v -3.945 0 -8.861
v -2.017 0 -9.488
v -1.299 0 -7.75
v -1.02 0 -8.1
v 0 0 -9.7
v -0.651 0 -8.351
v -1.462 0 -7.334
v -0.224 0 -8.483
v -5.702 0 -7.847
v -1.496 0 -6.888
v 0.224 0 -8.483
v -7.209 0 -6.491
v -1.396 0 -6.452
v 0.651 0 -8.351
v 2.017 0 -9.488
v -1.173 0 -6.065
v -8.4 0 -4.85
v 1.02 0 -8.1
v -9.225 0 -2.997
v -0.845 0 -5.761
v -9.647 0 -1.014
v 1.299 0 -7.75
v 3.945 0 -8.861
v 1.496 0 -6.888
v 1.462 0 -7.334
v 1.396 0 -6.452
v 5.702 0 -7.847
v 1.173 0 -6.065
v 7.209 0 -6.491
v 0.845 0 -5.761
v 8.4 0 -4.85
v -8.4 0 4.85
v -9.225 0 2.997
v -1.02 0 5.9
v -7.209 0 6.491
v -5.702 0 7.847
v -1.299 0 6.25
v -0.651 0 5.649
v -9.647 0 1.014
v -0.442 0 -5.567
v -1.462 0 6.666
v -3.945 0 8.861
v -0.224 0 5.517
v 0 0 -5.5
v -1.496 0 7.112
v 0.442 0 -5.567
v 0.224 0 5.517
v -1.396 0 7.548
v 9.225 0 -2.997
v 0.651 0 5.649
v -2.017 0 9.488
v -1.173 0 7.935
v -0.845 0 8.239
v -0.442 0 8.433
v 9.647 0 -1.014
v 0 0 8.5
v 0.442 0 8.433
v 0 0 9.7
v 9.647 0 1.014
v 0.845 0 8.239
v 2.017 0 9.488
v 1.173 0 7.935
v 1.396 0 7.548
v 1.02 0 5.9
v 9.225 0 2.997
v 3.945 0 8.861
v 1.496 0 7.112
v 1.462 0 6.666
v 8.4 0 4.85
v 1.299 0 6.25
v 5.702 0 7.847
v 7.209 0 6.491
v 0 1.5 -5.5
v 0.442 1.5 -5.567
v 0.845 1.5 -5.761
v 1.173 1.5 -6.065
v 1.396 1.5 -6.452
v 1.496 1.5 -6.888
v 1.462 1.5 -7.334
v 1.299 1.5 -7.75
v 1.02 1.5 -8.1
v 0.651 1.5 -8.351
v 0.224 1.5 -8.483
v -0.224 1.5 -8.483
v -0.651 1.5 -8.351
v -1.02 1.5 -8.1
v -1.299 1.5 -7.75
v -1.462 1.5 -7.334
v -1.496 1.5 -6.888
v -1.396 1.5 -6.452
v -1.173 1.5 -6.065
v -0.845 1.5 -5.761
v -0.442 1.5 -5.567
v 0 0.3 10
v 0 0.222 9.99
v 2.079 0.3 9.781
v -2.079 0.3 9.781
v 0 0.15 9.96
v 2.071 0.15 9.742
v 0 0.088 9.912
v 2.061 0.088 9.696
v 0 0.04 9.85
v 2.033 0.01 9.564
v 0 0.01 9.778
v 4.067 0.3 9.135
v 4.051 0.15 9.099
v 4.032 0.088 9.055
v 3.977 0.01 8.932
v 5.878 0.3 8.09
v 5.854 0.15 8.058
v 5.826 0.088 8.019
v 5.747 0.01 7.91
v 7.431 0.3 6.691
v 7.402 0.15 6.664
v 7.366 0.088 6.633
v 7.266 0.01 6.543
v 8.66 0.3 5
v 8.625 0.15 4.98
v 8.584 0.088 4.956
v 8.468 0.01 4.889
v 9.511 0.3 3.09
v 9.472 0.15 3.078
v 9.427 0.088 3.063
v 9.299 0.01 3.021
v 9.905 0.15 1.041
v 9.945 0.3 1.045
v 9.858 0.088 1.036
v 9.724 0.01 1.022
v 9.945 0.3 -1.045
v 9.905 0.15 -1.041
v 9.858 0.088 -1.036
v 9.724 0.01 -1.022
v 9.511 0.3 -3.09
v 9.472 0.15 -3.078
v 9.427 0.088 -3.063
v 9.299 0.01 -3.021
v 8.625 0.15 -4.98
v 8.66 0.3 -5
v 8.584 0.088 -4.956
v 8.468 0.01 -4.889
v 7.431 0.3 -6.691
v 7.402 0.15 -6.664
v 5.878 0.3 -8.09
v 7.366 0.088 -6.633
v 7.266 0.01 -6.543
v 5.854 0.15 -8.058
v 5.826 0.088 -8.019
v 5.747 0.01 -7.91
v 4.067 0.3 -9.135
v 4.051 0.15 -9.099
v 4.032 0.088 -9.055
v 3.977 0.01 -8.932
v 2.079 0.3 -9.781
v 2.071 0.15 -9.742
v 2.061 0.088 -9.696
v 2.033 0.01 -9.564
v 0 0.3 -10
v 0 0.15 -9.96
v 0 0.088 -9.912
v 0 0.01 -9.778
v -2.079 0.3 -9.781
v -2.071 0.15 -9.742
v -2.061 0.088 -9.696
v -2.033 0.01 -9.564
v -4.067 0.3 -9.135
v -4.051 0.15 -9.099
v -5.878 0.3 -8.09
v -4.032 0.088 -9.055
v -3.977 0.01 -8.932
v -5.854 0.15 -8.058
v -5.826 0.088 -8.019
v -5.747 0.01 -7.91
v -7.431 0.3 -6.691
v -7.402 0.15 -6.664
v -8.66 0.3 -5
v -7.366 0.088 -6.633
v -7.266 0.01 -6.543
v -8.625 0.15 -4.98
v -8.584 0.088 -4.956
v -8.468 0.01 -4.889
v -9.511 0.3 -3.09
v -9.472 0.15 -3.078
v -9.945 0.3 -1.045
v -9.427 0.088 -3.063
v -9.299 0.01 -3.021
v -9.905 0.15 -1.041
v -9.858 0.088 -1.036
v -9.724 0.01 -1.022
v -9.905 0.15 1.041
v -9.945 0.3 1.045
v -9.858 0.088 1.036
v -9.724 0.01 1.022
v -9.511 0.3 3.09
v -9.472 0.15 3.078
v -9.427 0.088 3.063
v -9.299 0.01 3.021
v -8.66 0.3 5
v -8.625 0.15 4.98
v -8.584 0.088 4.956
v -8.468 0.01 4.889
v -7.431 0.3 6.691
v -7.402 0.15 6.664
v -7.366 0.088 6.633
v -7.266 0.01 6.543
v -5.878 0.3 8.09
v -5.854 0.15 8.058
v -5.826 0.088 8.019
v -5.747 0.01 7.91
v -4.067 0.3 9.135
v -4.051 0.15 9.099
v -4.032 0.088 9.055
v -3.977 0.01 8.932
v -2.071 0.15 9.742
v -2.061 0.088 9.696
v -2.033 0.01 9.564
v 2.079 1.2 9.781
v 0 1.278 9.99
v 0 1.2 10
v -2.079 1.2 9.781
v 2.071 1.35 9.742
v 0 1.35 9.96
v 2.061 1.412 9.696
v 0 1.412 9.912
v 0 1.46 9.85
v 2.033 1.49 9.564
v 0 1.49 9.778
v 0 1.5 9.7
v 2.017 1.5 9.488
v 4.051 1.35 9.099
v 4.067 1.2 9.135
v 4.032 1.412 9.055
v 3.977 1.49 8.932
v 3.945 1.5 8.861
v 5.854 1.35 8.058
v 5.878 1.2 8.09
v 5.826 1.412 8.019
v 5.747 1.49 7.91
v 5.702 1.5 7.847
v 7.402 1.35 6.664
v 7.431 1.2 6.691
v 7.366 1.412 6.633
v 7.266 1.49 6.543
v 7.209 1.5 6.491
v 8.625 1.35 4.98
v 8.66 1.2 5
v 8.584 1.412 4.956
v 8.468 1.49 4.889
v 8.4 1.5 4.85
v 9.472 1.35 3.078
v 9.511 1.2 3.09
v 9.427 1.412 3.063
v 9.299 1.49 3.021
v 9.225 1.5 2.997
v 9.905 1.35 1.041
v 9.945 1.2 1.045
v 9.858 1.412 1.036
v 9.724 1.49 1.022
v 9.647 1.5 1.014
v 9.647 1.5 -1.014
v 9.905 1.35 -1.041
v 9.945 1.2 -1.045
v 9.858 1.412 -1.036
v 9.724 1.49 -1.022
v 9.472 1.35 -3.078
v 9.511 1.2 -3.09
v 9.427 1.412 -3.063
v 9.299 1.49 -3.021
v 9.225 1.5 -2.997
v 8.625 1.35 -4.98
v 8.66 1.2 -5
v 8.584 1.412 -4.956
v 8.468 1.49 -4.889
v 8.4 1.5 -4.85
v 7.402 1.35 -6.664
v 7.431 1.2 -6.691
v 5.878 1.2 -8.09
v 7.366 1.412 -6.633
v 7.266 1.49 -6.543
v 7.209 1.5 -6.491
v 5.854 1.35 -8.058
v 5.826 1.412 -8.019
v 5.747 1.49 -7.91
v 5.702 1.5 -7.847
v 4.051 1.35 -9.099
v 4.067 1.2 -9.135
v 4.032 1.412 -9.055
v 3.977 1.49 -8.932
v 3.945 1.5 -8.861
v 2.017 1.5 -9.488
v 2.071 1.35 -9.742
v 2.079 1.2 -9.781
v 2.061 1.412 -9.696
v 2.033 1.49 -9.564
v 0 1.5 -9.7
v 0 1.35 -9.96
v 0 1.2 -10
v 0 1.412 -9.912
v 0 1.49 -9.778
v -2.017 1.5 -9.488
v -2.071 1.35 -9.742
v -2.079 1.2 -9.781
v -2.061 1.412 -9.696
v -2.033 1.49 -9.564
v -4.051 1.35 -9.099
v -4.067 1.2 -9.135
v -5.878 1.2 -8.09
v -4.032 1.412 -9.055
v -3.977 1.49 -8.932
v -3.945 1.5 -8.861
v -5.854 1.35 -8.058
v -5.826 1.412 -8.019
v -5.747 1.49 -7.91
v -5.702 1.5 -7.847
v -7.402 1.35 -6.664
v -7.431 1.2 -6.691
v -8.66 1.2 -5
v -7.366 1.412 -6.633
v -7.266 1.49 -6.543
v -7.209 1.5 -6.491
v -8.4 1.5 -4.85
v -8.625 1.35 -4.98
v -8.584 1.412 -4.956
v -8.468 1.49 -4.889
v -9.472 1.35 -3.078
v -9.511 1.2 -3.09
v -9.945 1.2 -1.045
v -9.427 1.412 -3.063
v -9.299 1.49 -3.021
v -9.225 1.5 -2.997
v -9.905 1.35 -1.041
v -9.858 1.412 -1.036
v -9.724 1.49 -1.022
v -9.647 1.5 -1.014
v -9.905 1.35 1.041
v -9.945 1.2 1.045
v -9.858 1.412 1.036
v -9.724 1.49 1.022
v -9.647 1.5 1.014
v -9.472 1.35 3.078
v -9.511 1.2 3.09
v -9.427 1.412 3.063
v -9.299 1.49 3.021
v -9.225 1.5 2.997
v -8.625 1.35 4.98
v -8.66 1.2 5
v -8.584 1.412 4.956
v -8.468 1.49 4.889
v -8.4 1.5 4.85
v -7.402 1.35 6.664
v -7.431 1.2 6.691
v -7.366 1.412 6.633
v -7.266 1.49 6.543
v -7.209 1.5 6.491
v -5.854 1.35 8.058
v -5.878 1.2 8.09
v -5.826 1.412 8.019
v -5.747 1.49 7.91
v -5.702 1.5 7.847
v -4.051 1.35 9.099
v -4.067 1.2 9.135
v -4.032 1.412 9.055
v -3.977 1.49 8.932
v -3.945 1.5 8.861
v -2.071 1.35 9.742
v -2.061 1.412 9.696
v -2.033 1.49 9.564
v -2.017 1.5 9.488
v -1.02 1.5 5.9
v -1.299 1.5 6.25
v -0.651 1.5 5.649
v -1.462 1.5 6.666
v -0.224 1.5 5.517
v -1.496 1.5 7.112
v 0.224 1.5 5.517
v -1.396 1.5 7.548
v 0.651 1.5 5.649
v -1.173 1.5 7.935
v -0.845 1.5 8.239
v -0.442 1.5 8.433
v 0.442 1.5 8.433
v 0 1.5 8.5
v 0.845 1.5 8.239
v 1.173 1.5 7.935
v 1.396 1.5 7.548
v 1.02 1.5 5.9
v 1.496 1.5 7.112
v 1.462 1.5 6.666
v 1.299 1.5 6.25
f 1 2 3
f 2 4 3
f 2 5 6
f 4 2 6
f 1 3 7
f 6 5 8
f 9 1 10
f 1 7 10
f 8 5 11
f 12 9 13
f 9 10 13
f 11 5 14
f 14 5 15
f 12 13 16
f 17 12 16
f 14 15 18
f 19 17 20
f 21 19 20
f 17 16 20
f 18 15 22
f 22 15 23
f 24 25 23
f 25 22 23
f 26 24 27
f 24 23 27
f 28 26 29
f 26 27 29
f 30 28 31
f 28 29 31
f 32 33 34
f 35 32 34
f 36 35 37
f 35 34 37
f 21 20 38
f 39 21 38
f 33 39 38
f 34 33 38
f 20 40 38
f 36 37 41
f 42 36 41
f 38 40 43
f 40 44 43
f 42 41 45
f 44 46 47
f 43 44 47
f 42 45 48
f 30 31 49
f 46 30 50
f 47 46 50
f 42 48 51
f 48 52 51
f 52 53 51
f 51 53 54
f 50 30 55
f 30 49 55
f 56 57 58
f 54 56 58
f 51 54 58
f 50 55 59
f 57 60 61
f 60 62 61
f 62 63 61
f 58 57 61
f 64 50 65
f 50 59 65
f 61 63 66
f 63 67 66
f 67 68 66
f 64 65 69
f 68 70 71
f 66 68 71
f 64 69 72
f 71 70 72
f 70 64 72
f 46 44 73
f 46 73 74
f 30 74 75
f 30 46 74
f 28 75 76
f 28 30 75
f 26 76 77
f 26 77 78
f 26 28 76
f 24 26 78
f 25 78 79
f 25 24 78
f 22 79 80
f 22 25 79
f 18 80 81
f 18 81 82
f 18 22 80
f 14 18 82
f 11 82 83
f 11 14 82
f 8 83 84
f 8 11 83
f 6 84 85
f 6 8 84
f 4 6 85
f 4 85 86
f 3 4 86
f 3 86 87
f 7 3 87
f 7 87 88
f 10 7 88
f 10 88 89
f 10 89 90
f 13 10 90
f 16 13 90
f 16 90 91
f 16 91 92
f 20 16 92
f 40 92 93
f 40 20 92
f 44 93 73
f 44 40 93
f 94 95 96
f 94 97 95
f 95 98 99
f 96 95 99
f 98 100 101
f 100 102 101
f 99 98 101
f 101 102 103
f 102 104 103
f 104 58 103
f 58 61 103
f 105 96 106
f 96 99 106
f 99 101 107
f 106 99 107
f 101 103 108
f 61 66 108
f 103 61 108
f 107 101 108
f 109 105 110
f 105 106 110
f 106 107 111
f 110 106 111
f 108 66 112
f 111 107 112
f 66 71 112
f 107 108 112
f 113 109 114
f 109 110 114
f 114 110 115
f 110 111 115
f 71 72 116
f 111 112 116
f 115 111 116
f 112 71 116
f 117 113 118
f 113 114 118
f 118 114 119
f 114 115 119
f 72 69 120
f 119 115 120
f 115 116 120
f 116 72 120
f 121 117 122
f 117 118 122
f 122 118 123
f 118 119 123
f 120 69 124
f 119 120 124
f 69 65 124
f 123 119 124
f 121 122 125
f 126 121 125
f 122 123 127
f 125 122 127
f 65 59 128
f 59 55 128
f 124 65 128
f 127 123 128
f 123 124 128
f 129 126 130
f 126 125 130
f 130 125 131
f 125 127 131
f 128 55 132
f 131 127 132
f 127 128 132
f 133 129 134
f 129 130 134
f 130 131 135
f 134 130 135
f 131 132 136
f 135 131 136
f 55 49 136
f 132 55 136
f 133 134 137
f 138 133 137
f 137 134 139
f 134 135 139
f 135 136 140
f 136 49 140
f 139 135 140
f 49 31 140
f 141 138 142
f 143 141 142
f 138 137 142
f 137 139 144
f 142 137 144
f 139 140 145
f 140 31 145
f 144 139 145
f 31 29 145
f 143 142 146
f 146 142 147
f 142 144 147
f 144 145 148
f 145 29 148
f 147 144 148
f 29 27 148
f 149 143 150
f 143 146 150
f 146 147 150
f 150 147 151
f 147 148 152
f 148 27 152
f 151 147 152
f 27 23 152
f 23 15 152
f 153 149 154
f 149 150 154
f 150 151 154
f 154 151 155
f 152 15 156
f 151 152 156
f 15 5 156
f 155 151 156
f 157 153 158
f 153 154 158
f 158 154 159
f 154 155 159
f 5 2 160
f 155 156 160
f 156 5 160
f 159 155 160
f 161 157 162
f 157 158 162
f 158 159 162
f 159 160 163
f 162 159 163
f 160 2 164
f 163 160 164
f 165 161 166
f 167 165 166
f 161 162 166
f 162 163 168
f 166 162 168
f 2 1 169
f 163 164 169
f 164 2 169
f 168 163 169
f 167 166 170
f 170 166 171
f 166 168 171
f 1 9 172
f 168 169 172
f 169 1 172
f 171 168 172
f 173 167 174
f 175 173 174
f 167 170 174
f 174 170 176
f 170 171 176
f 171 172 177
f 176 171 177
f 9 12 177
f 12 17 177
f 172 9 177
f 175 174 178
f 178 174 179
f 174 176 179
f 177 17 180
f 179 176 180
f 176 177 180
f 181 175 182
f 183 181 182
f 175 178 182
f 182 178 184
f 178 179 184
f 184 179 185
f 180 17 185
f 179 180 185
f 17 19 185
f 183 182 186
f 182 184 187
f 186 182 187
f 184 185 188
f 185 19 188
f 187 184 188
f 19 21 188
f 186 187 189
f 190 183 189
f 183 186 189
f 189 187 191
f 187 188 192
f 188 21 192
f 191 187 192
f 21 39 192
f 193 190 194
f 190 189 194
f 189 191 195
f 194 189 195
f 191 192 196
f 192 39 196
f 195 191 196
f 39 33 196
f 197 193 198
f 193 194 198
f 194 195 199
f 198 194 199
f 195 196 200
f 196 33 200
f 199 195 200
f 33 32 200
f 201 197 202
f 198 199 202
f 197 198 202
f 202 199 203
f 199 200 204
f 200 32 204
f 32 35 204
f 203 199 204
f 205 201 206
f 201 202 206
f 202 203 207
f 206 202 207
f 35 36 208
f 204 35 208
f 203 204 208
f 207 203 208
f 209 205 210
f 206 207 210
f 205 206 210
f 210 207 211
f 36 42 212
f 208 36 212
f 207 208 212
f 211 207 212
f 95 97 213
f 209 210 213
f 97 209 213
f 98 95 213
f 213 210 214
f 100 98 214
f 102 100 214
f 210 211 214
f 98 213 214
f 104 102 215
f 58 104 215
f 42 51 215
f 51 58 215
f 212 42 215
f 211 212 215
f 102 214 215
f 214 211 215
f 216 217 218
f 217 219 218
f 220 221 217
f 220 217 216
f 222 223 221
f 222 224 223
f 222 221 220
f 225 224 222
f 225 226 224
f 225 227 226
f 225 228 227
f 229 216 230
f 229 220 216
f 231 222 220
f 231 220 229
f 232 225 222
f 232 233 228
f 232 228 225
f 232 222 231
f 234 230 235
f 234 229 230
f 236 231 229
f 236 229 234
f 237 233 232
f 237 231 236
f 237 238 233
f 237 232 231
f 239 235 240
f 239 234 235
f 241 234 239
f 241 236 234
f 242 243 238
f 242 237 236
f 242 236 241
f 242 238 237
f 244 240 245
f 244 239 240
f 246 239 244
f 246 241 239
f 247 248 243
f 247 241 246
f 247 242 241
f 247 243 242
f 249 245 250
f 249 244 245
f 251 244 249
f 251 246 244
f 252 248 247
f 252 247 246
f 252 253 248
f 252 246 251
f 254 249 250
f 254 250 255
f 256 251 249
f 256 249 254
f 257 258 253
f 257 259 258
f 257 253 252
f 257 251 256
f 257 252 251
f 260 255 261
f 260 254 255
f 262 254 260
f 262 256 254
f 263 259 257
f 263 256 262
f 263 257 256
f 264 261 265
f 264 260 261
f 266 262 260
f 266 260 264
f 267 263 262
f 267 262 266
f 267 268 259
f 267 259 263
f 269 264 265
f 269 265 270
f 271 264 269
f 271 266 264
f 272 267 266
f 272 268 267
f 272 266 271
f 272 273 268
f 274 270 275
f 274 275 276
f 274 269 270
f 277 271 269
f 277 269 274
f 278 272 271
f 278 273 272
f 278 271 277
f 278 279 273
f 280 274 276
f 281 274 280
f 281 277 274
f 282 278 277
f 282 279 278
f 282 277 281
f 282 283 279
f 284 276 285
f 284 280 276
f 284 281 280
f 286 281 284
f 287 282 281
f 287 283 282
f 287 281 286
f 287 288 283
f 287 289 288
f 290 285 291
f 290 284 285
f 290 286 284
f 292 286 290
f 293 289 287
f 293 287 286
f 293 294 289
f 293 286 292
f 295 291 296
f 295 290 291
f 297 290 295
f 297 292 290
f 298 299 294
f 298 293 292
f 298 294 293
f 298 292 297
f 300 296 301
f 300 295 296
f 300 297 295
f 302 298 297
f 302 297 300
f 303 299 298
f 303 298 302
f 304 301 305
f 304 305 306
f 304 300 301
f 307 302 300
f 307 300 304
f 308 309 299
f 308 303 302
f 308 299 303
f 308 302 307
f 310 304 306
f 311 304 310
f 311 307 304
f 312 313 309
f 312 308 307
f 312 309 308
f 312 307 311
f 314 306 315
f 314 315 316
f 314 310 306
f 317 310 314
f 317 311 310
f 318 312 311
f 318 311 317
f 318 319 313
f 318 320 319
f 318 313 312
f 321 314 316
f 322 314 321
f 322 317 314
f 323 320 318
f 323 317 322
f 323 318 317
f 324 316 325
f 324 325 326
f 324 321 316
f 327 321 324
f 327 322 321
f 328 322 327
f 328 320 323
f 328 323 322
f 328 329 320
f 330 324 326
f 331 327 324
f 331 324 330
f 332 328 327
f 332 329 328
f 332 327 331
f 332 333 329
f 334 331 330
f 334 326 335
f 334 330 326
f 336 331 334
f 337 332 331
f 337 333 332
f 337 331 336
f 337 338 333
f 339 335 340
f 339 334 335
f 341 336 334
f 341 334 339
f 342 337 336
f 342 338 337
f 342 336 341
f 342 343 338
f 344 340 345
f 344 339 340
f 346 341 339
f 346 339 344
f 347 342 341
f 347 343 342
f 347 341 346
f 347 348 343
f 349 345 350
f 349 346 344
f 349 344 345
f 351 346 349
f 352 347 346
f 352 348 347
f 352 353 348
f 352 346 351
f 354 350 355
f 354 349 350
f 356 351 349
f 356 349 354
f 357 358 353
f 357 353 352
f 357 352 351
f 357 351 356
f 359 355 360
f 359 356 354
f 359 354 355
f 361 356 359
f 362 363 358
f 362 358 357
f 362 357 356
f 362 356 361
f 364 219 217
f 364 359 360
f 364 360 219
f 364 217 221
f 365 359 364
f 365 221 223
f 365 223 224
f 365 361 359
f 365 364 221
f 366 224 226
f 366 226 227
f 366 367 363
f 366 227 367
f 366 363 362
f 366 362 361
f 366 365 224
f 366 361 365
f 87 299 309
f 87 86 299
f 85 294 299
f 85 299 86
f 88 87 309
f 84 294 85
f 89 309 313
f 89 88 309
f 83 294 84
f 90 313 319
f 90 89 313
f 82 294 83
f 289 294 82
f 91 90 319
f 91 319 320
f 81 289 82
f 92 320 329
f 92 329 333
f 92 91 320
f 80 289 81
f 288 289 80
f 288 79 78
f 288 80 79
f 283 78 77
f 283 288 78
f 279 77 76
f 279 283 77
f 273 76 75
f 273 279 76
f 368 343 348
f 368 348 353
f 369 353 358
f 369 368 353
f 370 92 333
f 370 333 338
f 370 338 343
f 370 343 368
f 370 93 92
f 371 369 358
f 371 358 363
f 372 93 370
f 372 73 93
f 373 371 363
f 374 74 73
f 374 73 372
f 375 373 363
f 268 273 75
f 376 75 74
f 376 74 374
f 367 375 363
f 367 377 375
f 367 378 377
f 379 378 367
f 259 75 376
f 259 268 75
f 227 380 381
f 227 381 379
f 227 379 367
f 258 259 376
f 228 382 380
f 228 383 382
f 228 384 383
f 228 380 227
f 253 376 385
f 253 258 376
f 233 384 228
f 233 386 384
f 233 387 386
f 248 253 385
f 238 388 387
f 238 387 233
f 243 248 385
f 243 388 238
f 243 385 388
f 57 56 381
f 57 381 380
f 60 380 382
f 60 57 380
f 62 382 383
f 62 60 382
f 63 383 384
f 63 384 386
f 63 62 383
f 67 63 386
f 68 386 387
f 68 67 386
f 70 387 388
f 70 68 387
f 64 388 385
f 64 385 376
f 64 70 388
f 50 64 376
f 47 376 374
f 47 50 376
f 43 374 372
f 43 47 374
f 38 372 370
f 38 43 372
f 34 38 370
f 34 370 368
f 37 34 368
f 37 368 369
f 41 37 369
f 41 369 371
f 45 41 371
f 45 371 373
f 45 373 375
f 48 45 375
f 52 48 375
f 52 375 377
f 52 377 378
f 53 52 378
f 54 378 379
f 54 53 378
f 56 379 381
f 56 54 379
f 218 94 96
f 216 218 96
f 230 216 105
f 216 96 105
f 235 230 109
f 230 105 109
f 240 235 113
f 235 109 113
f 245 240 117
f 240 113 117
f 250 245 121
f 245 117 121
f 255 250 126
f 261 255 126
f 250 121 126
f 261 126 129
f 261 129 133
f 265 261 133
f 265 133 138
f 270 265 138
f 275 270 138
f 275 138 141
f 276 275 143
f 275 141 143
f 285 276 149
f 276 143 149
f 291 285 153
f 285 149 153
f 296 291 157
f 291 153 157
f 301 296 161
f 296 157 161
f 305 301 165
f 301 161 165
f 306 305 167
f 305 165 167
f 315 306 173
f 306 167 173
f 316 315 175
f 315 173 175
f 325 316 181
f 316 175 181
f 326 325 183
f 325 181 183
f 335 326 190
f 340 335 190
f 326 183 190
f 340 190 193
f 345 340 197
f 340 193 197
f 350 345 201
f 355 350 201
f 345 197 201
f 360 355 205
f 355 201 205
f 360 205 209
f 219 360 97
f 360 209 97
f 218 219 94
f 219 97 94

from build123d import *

# Parameters (mm, degrees)
SKETCH_1_R      = 10
SKETCH_1_R_2    = 1.5
EXTRUDE_1_DEPTH = 1.5
FILLET_1_R      = 0.3


with BuildPart() as part:
    # 草图1 → 凸台-拉伸1 (new body)
    with BuildSketch(Plane(origin=(0, 0, 0), x_dir=(1, 0, 0), z_dir=(0, 1, 0))):
        with Locations(Location((0, 0, 0), (0, 0, 270))):
            Circle(SKETCH_1_R)
        with Locations(Location((0, 7, 0), (0, 0, 270))):
            Circle(SKETCH_1_R_2, mode=Mode.SUBTRACT)
        with Locations(Location((0, -7, 0), (0, 0, 270))):
            Circle(SKETCH_1_R_2, mode=Mode.SUBTRACT)
    extrude(amount=EXTRUDE_1_DEPTH)

    # 圆角1
    fillet_1_edges = [part.edges().sort_by_distance(p)[0] for p in [
        (0, 0, -10),
        (0, 1.5, -10),
    ]]
    fillet(fillet_1_edges, radius=FILLET_1_R)


solid = part.part
